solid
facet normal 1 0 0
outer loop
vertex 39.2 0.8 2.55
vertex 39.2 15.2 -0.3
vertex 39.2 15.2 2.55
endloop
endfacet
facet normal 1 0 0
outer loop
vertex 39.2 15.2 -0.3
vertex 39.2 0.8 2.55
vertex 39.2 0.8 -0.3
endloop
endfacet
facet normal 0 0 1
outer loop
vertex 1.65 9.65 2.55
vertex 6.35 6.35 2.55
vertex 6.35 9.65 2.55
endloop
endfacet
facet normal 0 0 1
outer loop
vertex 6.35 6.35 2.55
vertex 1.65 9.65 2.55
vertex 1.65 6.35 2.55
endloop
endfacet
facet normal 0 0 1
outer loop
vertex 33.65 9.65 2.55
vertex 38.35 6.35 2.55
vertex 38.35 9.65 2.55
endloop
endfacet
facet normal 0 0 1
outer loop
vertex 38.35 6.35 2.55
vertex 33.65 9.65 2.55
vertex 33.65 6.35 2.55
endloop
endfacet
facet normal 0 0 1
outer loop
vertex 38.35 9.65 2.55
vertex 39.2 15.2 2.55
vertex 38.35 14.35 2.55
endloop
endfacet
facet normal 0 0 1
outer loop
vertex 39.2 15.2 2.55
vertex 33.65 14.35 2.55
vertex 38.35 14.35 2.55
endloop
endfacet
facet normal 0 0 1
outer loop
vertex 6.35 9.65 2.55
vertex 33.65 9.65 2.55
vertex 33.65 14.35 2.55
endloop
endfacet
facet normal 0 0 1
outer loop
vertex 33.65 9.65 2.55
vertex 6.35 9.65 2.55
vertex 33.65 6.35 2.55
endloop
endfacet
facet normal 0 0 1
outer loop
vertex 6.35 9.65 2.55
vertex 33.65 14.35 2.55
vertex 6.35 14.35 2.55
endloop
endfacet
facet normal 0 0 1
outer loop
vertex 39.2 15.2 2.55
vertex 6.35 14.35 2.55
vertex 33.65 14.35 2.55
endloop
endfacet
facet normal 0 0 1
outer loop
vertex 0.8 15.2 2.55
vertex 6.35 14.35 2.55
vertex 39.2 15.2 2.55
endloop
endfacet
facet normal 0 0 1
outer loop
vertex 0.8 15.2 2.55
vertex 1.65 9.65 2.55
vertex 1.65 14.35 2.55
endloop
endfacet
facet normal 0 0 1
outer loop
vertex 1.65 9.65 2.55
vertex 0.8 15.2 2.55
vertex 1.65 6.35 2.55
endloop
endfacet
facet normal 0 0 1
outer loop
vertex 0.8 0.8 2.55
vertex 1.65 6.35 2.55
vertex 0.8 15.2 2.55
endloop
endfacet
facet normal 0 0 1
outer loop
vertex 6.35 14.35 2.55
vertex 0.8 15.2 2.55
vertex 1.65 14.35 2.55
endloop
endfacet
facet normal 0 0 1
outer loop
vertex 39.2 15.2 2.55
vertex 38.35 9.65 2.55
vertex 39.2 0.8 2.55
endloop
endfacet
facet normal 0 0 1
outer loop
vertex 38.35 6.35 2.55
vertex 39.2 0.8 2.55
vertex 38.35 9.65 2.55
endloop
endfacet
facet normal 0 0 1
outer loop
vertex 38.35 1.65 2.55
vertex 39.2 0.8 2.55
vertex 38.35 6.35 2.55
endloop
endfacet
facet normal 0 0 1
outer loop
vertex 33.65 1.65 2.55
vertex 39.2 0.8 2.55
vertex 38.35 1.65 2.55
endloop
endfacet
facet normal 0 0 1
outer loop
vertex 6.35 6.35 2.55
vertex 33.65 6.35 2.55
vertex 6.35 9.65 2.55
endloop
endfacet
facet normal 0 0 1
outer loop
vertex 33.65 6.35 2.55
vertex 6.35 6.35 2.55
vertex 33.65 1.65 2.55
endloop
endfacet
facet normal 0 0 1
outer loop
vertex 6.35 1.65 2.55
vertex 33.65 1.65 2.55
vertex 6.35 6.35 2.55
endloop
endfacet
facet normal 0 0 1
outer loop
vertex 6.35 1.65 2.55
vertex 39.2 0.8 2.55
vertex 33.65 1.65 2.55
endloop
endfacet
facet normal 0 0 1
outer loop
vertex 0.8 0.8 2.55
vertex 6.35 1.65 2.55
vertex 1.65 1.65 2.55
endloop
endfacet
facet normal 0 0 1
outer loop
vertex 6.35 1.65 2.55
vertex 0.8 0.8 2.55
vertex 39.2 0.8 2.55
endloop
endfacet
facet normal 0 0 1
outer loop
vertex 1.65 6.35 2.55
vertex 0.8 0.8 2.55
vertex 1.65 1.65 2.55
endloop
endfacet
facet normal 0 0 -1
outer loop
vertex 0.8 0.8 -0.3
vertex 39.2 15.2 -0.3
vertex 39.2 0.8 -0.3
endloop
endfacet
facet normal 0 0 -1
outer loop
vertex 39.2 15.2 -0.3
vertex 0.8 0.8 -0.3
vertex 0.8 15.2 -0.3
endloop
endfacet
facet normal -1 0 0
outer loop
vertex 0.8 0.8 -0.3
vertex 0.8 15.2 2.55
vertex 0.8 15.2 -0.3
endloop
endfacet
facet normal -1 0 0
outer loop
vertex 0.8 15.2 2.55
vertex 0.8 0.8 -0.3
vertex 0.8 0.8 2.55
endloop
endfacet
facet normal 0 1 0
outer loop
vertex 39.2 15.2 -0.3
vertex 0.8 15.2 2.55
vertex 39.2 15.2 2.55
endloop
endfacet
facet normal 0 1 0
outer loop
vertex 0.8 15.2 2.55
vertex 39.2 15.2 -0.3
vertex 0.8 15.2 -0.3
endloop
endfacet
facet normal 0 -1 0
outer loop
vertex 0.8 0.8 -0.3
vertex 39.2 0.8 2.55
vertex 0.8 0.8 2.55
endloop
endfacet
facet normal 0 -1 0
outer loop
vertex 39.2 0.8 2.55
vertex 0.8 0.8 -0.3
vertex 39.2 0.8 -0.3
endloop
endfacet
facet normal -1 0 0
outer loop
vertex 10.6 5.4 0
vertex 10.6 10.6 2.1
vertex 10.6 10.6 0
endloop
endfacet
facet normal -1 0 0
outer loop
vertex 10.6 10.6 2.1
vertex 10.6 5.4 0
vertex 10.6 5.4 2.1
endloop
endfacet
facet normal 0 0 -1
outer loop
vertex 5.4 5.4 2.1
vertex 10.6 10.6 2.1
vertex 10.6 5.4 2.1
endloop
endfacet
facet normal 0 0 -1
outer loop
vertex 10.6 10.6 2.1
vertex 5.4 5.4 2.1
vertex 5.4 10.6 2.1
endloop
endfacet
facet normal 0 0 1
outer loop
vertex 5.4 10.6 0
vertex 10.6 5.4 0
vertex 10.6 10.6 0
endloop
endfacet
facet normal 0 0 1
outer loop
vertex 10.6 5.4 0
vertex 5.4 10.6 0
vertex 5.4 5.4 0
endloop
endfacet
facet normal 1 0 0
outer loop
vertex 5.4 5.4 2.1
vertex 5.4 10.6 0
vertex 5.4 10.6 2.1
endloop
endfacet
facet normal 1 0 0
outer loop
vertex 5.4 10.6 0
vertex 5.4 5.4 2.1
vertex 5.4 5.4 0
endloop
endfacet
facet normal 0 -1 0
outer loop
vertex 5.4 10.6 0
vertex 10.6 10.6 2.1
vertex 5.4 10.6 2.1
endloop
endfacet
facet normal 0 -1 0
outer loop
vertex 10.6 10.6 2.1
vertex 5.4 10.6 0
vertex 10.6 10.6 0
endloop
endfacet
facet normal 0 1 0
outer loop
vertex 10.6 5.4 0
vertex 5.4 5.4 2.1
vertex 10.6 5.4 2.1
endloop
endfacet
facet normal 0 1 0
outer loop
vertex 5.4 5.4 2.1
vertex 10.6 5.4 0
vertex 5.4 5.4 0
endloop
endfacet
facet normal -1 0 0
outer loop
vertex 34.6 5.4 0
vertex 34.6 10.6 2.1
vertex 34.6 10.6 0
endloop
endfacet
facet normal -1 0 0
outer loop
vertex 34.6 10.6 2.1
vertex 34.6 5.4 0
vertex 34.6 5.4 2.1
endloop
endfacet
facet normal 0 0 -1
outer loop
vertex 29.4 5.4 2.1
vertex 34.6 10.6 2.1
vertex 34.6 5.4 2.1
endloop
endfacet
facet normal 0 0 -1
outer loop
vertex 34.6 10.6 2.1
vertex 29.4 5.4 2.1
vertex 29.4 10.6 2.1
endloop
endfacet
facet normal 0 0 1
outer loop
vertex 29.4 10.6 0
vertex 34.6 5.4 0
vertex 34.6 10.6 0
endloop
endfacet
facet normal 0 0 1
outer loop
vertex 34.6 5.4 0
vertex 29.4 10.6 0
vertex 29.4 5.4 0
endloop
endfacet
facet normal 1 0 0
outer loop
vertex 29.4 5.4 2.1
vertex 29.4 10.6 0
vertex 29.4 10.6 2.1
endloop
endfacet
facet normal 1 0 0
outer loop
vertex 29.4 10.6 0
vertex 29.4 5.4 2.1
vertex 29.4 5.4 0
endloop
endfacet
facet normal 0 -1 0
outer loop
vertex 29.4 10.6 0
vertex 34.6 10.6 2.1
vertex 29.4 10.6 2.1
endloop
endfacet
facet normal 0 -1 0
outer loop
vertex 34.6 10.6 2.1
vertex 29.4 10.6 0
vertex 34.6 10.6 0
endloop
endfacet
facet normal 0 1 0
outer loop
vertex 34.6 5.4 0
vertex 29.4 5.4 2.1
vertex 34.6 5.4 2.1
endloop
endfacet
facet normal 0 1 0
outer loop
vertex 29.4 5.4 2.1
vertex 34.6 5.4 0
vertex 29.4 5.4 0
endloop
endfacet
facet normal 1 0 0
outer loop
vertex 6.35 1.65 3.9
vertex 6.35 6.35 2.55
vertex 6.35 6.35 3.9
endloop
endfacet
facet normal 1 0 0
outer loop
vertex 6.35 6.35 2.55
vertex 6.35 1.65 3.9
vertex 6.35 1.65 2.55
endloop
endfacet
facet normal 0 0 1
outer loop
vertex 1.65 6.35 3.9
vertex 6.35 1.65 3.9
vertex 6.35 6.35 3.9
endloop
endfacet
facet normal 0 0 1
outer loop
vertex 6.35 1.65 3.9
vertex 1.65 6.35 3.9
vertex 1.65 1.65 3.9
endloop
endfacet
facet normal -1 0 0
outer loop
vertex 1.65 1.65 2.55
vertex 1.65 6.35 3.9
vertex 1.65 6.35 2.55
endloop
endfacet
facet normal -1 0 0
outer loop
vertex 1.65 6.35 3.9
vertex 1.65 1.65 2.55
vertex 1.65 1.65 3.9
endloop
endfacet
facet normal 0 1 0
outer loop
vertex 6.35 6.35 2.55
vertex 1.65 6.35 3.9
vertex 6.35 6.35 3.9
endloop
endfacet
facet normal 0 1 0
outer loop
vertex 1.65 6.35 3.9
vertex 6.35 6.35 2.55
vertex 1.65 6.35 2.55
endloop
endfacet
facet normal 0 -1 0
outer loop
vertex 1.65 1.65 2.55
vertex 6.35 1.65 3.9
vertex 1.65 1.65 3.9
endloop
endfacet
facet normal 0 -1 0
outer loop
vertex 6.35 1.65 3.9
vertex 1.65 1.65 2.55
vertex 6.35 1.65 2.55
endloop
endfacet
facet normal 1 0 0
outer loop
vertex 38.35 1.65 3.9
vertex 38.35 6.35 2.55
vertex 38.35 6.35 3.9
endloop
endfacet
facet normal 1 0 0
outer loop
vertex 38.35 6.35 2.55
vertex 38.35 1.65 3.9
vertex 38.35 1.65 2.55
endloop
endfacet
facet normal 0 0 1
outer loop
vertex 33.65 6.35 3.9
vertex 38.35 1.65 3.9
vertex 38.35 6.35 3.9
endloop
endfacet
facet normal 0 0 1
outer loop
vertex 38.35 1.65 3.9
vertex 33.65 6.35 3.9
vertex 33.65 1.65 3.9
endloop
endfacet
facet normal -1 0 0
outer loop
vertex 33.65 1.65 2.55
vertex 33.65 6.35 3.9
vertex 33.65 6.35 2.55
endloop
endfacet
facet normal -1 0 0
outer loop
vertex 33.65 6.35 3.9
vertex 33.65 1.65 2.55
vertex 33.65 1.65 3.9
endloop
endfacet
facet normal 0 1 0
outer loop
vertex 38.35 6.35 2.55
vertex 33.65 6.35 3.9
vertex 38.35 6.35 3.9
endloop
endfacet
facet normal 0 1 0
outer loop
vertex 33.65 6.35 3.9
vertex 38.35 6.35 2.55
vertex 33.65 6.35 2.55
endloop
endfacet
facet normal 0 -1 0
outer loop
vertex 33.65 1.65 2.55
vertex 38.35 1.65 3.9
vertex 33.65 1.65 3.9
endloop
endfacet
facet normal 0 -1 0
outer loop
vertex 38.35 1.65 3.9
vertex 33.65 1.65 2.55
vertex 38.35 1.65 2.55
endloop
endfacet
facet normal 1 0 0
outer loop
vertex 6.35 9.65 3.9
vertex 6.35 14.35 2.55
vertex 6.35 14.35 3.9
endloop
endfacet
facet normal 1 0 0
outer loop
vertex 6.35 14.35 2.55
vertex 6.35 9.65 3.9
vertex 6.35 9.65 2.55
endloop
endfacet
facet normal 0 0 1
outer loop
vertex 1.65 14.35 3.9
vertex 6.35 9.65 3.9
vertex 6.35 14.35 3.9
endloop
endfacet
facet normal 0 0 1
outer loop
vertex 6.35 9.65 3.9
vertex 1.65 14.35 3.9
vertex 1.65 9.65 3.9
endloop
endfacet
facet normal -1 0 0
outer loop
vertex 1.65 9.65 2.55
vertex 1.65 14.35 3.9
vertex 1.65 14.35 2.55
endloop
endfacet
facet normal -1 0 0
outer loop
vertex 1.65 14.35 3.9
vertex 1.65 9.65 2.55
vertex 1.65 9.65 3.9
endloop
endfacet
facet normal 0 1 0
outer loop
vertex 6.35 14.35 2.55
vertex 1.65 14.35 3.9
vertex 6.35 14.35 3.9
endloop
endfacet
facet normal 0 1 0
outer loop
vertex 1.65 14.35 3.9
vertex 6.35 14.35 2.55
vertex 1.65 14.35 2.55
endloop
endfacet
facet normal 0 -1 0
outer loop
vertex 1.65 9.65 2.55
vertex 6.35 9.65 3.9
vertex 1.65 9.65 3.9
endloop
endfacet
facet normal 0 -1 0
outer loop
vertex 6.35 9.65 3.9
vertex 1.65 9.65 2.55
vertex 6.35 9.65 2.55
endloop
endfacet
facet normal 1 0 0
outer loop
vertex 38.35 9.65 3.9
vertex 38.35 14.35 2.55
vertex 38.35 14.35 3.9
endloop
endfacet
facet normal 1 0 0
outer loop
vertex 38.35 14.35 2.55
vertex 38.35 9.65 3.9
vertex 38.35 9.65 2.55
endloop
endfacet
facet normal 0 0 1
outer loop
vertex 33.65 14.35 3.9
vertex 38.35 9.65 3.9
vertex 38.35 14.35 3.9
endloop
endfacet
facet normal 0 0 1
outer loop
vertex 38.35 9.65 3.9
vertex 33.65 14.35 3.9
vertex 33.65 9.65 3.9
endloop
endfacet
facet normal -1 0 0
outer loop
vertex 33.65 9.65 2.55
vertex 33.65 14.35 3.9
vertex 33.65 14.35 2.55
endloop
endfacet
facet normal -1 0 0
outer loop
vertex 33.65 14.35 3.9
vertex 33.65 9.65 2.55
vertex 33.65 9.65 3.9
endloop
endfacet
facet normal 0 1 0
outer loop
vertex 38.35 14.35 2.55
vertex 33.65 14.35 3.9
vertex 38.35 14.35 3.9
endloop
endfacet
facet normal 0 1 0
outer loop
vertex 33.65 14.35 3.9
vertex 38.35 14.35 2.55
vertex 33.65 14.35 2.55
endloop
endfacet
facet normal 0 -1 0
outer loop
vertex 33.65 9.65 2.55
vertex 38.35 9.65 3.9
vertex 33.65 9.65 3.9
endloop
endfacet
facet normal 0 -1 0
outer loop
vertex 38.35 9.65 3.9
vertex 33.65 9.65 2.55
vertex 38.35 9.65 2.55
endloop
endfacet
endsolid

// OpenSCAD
// Base
perforatedSheetThickness = 1.4;  // mm
perforatedSheetHoleSize = 4.8;   // mm
perforatedSheetGridSize = 8;     // mm
// parameters
printTolerances = 0.05;         // mm to ajust for over extrusion of the printer
borderDistance  = 0.80;          // shrink the outside dimensions, so there is a bit of play between different parts
// part size
partThickness   = 02.85;         // mm above perforated sheet. at leat 2.85mm with the magnets
partLength      = 5;             // in grid-blocks
partWidth       = 2;             // in grid Blocks


module magnetPocket(center=[0,0,0],height=2.1, size=5.1) {
    translate(center) {
        translate([0,0,height/2]) cube([size + 2 * printTolerances,size + 2 * printTolerances, height], center = true);
    };
};

module foot(center=[0,0,0]) {
    translate(center) {
        translate([0,0,perforatedSheetThickness * 0.5]) cube([perforatedSheetHoleSize - 2 * printTolerances, perforatedSheetHoleSize - 2 * printTolerances, perforatedSheetThickness ], center = true);
    };
};
union() {
    difference() {
        translate([borderDistance, borderDistance, 2.55 - partThickness]) cube([partLength * perforatedSheetGridSize - 2 * borderDistance, partWidth * perforatedSheetGridSize - 2 * borderDistance, partThickness]);

        magnetPocket([8, 8, 0]);
        magnetPocket([partLength * perforatedSheetGridSize -8, 8, 0]);
        magnetPocket([8, partWidth * perforatedSheetGridSize - 8, 0]);
        magnetPocket([partLength * perforatedSheetGridSize -8, partWidth * perforatedSheetGridSize - 8, 0]);
//        translate([4, 4+24, 0]) {
//            translate([0,0,partThickness/2]) cube([8,8,2*partThickness], center = true);
//        };
    }
    foot([4, 4, 2.5]);
    foot([partLength * perforatedSheetGridSize -4, 4, 2.5]);
    foot([4, partWidth * perforatedSheetGridSize - 4, 2.5]);
    foot([partLength * perforatedSheetGridSize -4, partWidth * perforatedSheetGridSize - 4, 2.5]);
};
